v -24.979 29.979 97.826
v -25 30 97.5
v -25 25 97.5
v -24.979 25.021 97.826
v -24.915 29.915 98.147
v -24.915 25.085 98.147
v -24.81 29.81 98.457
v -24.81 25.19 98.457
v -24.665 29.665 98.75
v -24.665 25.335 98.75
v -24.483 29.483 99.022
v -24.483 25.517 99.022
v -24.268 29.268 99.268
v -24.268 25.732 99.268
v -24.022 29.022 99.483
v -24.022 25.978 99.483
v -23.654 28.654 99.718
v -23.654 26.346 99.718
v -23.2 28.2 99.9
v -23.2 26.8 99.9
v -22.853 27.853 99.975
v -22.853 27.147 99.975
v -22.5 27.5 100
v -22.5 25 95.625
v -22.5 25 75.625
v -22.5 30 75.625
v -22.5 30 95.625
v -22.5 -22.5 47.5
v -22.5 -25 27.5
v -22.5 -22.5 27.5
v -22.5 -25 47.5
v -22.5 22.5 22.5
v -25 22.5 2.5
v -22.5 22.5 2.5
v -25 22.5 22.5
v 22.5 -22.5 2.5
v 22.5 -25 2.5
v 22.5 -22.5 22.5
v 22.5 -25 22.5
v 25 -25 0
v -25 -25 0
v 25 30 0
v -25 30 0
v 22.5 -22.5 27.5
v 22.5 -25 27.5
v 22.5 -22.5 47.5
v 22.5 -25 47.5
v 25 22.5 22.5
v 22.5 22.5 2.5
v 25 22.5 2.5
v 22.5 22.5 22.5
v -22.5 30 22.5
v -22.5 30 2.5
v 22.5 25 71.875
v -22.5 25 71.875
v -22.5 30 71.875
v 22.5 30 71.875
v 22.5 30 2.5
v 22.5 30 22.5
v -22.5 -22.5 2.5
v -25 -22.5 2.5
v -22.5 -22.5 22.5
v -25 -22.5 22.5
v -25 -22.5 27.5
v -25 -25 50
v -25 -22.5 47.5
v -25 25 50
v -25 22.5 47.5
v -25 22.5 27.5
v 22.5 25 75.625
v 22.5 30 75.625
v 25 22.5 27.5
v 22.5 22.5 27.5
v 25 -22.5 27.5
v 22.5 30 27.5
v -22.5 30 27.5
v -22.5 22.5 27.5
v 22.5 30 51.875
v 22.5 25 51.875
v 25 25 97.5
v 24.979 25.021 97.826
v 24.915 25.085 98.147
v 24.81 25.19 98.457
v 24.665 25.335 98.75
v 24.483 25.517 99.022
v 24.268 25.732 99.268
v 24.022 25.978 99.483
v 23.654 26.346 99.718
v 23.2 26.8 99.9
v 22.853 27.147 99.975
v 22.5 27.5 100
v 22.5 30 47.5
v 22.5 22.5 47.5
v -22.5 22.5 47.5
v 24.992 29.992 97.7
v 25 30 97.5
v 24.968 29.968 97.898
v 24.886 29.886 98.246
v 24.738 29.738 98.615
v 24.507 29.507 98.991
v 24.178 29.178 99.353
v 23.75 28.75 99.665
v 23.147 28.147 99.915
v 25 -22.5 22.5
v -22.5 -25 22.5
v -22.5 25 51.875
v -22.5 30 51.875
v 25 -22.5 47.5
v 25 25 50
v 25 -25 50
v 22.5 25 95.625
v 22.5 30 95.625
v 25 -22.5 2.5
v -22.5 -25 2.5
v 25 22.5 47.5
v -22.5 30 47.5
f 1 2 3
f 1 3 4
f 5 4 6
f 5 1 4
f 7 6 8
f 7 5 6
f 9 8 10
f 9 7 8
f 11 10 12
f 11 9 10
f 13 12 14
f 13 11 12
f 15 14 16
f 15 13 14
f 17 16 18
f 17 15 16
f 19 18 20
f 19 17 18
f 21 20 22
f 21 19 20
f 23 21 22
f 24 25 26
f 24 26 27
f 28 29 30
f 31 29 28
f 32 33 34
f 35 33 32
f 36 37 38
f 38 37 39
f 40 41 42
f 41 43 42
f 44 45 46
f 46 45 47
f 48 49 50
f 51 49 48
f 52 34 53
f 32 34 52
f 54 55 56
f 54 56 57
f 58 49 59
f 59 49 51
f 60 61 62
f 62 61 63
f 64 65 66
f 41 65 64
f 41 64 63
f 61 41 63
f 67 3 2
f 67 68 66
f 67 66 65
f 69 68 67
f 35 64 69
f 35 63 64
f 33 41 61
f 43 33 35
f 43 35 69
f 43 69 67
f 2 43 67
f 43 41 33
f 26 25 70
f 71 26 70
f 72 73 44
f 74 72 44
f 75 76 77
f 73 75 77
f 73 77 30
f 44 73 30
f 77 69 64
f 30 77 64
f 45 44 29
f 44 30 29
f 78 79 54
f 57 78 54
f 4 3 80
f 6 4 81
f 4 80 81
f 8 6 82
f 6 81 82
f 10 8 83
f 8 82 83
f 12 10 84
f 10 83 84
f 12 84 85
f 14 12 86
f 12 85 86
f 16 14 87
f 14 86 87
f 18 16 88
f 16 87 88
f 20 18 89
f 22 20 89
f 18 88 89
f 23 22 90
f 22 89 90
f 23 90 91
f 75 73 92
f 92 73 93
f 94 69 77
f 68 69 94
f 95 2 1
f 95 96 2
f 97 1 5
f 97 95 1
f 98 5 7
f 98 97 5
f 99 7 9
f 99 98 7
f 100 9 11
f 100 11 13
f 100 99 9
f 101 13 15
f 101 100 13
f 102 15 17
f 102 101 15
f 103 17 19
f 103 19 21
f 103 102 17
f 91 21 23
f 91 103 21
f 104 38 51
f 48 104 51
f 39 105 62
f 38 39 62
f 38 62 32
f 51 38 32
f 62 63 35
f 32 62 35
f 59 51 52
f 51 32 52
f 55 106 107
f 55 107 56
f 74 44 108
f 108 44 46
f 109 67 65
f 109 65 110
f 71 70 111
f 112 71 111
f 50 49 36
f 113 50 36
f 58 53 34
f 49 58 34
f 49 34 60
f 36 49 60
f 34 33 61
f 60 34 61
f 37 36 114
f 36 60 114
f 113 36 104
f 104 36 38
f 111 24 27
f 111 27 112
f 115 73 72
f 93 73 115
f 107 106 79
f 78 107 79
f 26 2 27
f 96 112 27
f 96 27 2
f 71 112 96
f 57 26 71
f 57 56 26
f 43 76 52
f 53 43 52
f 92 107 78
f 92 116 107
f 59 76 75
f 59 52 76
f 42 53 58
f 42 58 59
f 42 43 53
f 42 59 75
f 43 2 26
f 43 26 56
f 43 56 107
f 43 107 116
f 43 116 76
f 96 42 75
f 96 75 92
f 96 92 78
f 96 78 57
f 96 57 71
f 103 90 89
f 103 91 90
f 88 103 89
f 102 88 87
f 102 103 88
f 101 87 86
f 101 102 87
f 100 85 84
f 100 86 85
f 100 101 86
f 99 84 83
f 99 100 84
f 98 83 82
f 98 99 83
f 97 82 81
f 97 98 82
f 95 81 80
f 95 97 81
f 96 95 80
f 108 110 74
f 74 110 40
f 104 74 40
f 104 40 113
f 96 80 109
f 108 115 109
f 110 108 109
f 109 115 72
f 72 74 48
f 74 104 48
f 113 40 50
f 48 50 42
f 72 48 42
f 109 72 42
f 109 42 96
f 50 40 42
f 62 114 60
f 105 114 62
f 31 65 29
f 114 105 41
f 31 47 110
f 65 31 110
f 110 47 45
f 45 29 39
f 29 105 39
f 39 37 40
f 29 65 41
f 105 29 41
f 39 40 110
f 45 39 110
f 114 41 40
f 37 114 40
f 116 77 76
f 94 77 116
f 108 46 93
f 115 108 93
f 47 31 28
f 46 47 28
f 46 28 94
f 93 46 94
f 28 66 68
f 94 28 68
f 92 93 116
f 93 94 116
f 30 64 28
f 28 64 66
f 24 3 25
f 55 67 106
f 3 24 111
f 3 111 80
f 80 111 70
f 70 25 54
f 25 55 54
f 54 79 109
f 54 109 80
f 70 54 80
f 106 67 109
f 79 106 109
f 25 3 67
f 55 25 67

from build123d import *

# Parameters (mm, degrees)
F0_W     = 50
F0_H     = 5
F1_DEPTH = 100
F0_H_2   = 50
F2_DEPTH = 50
F3_W     = 22.5
F3_H     = 20
F4_DEPTH = 100
F5_W     = 22.5
F5_H     = 20
F6_DEPTH = 55
F7_R     = 2.49999
F8_W     = 45
F8_H     = 20
F9_DEPTH = 25


# Not quite as in the source:
# - a fillet or chamfer is up to 0.001 mm smaller than in the source, because OpenCascade refuses the exact size


with BuildPart() as f1:
    # F0 (on Top) → F1 (new body)
    with BuildSketch(Plane.XY):
        with Locations((0, 27.5)):
            Rectangle(F0_W, F0_H)
    extrude(amount=F1_DEPTH)

    # F0 (on Top) → F2 (join)
    with BuildSketch(Plane.XY):
        Rectangle(F0_W, F0_H_2)
    extrude(amount=F2_DEPTH)

    # F3 (on face) → F4 (cut)
    with BuildSketch(Plane.XZ.offset(25)):
        with Locations((-11.25, 37.5)):
            Rectangle(F3_W, F3_H)
        with Locations((11.25, 37.5)):
            Rectangle(F3_W, F3_H)
        with Locations((-11.25, 12.5)):
            Rectangle(F3_W, F3_H)
        with Locations((11.25, 12.5)):
            Rectangle(F3_W, F3_H)
    extrude(amount=-F4_DEPTH, mode=Mode.SUBTRACT)

    # F5 (on face) → F6 (cut)
    with BuildSketch(Plane(origin=(-25, 0, 0), x_dir=(0, -1, 0), z_dir=(-1, 0, 0))):
        with Locations((-11.25, 37.5)):
            Rectangle(F5_W, F5_H)
        with Locations((11.25, 37.5)):
            Rectangle(F5_W, F5_H)
        with Locations((11.25, 12.5)):
            Rectangle(F5_W, F5_H)
        with Locations((-11.25, 12.5)):
            Rectangle(F5_W, F5_H)
    extrude(amount=-F6_DEPTH, mode=Mode.SUBTRACT)

    # F7 (radius 2.5 in the source; OpenCascade refuses exactly that, so slightly less here)
    f7_edges = [f1.edges().sort_by_distance(p)[0] for p in [
        (0, 25, 100),
        (25, 27.5, 100),
        (0, 30, 100),
        (-25, 27.5, 100),
    ]]
    fillet(f7_edges, radius=F7_R)

    # F8 (on face) → F9 (cut)
    with BuildSketch(Plane.XZ.offset(-25)):
        with Locations((0, 85.625)):
            Rectangle(F8_W, F8_H)
        with Locations((0, 61.875)):
            Rectangle(F8_W, F8_H)
    extrude(amount=-F9_DEPTH, mode=Mode.SUBTRACT)


solid = f1.part
